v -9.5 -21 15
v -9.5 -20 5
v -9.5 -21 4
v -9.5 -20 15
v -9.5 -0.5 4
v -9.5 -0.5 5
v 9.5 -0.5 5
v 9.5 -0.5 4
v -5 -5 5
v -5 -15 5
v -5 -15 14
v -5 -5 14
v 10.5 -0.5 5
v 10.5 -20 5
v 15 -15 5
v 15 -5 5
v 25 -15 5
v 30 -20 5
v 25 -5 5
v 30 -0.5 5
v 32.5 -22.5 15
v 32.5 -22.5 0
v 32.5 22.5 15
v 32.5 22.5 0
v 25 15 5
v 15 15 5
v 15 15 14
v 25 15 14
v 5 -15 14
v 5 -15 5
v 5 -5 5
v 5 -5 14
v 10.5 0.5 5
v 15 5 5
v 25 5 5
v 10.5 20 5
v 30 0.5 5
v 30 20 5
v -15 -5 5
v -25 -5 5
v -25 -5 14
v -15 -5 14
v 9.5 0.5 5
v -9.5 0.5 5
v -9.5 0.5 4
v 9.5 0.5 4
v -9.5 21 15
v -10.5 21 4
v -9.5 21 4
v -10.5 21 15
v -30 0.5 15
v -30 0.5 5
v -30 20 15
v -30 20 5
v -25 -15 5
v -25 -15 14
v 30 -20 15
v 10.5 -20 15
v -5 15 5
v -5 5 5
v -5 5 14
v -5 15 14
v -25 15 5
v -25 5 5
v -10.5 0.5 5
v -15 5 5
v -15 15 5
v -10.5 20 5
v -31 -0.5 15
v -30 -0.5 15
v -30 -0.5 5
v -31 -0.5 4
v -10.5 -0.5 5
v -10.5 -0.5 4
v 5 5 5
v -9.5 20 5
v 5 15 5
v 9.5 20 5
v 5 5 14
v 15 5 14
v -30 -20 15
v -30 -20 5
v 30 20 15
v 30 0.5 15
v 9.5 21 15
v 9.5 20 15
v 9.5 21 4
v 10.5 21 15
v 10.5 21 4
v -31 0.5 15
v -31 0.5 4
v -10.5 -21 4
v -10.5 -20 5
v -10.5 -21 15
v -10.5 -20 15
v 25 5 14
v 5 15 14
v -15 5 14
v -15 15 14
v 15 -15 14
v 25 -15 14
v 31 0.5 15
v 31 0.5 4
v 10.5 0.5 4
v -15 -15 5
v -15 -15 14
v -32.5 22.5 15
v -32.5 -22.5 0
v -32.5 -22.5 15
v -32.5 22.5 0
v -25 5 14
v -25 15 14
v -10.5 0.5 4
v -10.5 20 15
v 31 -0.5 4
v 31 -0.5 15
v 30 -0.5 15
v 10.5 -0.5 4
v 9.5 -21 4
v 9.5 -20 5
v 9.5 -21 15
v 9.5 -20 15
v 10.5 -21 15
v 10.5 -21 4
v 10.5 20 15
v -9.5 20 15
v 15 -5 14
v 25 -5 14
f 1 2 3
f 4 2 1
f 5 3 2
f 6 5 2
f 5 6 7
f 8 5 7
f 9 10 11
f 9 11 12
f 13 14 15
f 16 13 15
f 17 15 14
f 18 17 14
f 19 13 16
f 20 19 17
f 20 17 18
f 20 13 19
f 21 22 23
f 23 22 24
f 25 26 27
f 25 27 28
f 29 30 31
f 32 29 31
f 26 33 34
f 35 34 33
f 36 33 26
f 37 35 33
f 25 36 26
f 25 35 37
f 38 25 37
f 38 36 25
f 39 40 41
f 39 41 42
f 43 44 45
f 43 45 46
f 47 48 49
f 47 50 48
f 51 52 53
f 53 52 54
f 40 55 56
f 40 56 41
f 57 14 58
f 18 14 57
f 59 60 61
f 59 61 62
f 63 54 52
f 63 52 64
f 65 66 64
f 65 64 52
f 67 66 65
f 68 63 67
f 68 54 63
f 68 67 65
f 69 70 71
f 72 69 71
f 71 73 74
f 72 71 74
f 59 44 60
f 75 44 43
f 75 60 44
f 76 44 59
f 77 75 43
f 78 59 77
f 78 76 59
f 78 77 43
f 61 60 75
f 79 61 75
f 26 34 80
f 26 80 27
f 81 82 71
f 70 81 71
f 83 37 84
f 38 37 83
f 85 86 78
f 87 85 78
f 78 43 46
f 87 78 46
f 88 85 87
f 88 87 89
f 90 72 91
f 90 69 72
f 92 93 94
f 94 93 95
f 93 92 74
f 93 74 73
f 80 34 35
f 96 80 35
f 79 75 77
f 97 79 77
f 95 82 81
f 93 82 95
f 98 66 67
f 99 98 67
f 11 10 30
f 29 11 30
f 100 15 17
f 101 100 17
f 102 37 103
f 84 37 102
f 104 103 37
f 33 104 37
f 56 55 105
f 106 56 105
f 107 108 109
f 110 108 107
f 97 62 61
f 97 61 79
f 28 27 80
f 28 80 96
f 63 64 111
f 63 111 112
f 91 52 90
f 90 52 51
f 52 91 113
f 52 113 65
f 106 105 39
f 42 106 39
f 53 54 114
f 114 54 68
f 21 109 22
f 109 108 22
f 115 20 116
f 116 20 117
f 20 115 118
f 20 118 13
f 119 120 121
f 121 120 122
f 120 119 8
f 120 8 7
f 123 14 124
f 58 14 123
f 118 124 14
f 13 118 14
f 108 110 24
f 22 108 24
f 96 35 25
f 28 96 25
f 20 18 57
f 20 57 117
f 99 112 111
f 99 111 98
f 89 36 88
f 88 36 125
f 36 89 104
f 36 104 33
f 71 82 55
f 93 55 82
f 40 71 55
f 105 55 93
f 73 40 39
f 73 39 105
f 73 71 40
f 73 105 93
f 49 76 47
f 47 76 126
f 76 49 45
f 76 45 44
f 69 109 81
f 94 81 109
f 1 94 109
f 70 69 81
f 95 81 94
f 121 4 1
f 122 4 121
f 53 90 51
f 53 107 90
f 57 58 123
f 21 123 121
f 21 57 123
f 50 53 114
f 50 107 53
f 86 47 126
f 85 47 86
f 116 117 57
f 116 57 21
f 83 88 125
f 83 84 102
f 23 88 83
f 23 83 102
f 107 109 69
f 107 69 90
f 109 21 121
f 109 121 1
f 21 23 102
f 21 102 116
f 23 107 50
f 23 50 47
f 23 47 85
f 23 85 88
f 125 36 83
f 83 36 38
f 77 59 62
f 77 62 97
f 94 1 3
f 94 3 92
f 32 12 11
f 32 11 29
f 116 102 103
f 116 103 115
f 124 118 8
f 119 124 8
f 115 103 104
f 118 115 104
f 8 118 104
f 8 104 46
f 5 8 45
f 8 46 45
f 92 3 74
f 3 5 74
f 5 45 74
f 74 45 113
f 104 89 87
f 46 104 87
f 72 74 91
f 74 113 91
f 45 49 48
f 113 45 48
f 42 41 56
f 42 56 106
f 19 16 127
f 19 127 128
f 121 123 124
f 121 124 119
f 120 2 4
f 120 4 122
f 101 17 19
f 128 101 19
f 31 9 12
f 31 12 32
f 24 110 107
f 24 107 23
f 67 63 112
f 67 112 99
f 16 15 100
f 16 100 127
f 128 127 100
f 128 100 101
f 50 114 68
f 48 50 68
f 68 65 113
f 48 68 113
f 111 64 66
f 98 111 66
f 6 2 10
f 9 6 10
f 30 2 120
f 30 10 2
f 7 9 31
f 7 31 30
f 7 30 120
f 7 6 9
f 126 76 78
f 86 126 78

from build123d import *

# Parameters (mm, degrees)
F0_W      = 65
F0_H      = 45
F1_DEPTH  = 5
F2_W      = 65
F2_H      = 45
F2_W_2    = 60
F2_H_2    = 40
F3_DEPTH  = 10
F4_W      = 19.5
F4_H      = 1
F4_W_2    = 1
F4_H_2    = 19.5
F4_W_3    = 19
F5_DEPTH  = 1
F7_DEPTH  = 1
F11_DEPTH = 1
F9_W      = 1
F9_H      = 11
F12_DEPTH = 1
F8_W      = 1
F8_H      = 11
F13_DEPTH = 1
F14_W     = 10
F14_H     = 10
F15_DEPTH = 9


with BuildPart() as f1:
    # F0 (on Top) → F1 (new body)
    with BuildSketch(Plane.XY):
        Rectangle(F0_W, F0_H)
    extrude(amount=F1_DEPTH)

    # F2 (on face) → F3 (join)
    with BuildSketch(Plane.XY.offset(5)):
        Rectangle(F2_W, F2_H)
        Rectangle(F2_W_2, F2_H_2, mode=Mode.SUBTRACT)
    extrude(amount=F3_DEPTH)

    # F4 (on face) → F5 (cut)
    with BuildSketch(Plane.XY.offset(5)):
        with Locations((-20.25, 0)):
            Rectangle(F4_W, F4_H)
        with Locations((-10, 0)):
            Rectangle(F4_W_2, F4_H)
        with Locations((-10, 10.25)):
            Rectangle(F4_W_2, F4_H_2)
        with Locations((-10, -10.25)):
            Rectangle(F4_W_2, F4_H_2)
        Rectangle(F4_W_3, F4_H)
        with Locations((10, 10.25)):
            Rectangle(F4_W_2, F4_H_2)
        with Locations((10, -10.25)):
            Rectangle(F4_W_2, F4_H_2)
        with Locations((20.25, 0)):
            Rectangle(F4_W, F4_H)
        with Locations((10, 0)):
            Rectangle(F4_W_2, F4_H)
    extrude(amount=-F5_DEPTH, mode=Mode.SUBTRACT)

    # F6 (on face) → F7 (cut)
    with BuildSketch(Plane.XZ.offset(-20)):
        Polygon((-10.5, 5), (-10.5, 4), (-9.5, 4), (-9.5, 5), (-9.5, 15), (-10.5, 15), align=None)
        Polygon((9.5, 15), (9.5, 5), (9.5, 4), (10.5, 4), (10.5, 5), (10.5, 15), align=None)
    extrude(amount=-F7_DEPTH, mode=Mode.SUBTRACT)

    # F10 (on face) → F11 (cut)
    with BuildSketch(Plane.YZ.offset(-30)):
        Polygon((-0.5, 5), (-0.5, 4), (0.5, 4), (0.5, 5), (0.5, 15), (-0.5, 15), align=None)
    extrude(amount=-F11_DEPTH, mode=Mode.SUBTRACT)

    # F9 (on face) → F12 (cut)
    with BuildSketch(Plane(origin=(0, -20, 0), x_dir=(-1, 0, 0), z_dir=(0, 1, 0))):
        with Locations((-10, 9.5)):
            Rectangle(F9_W, F9_H)
        with Locations((10, 9.5)):
            Rectangle(F9_W, F9_H)
    extrude(amount=-F12_DEPTH, mode=Mode.SUBTRACT)

    # F8 (on face) → F13 (cut)
    with BuildSketch(Plane(origin=(30, 0, 0), x_dir=(0, -1, 0), z_dir=(-1, 0, 0))):
        with Locations((0, 9.5)):
            Rectangle(F8_W, F8_H)
    extrude(amount=-F13_DEPTH, mode=Mode.SUBTRACT)

    # F14 (on face) → F15 (join)
    with BuildSketch(Plane.XY.offset(5)):
        with Locations((-20, 10)):
            Rectangle(F14_W, F14_H)
        with Locations((0, 10)):
            Rectangle(F14_W, F14_H)
        with Locations((20, 10)):
            Rectangle(F14_W, F14_H)
        with Locations((20, -10)):
            Rectangle(F14_W, F14_H)
        with Locations((0, -10)):
            Rectangle(F14_W, F14_H)
        with Locations((-20, -10)):
            Rectangle(F14_W, F14_H)
    extrude(amount=F15_DEPTH)


solid = f1.part
